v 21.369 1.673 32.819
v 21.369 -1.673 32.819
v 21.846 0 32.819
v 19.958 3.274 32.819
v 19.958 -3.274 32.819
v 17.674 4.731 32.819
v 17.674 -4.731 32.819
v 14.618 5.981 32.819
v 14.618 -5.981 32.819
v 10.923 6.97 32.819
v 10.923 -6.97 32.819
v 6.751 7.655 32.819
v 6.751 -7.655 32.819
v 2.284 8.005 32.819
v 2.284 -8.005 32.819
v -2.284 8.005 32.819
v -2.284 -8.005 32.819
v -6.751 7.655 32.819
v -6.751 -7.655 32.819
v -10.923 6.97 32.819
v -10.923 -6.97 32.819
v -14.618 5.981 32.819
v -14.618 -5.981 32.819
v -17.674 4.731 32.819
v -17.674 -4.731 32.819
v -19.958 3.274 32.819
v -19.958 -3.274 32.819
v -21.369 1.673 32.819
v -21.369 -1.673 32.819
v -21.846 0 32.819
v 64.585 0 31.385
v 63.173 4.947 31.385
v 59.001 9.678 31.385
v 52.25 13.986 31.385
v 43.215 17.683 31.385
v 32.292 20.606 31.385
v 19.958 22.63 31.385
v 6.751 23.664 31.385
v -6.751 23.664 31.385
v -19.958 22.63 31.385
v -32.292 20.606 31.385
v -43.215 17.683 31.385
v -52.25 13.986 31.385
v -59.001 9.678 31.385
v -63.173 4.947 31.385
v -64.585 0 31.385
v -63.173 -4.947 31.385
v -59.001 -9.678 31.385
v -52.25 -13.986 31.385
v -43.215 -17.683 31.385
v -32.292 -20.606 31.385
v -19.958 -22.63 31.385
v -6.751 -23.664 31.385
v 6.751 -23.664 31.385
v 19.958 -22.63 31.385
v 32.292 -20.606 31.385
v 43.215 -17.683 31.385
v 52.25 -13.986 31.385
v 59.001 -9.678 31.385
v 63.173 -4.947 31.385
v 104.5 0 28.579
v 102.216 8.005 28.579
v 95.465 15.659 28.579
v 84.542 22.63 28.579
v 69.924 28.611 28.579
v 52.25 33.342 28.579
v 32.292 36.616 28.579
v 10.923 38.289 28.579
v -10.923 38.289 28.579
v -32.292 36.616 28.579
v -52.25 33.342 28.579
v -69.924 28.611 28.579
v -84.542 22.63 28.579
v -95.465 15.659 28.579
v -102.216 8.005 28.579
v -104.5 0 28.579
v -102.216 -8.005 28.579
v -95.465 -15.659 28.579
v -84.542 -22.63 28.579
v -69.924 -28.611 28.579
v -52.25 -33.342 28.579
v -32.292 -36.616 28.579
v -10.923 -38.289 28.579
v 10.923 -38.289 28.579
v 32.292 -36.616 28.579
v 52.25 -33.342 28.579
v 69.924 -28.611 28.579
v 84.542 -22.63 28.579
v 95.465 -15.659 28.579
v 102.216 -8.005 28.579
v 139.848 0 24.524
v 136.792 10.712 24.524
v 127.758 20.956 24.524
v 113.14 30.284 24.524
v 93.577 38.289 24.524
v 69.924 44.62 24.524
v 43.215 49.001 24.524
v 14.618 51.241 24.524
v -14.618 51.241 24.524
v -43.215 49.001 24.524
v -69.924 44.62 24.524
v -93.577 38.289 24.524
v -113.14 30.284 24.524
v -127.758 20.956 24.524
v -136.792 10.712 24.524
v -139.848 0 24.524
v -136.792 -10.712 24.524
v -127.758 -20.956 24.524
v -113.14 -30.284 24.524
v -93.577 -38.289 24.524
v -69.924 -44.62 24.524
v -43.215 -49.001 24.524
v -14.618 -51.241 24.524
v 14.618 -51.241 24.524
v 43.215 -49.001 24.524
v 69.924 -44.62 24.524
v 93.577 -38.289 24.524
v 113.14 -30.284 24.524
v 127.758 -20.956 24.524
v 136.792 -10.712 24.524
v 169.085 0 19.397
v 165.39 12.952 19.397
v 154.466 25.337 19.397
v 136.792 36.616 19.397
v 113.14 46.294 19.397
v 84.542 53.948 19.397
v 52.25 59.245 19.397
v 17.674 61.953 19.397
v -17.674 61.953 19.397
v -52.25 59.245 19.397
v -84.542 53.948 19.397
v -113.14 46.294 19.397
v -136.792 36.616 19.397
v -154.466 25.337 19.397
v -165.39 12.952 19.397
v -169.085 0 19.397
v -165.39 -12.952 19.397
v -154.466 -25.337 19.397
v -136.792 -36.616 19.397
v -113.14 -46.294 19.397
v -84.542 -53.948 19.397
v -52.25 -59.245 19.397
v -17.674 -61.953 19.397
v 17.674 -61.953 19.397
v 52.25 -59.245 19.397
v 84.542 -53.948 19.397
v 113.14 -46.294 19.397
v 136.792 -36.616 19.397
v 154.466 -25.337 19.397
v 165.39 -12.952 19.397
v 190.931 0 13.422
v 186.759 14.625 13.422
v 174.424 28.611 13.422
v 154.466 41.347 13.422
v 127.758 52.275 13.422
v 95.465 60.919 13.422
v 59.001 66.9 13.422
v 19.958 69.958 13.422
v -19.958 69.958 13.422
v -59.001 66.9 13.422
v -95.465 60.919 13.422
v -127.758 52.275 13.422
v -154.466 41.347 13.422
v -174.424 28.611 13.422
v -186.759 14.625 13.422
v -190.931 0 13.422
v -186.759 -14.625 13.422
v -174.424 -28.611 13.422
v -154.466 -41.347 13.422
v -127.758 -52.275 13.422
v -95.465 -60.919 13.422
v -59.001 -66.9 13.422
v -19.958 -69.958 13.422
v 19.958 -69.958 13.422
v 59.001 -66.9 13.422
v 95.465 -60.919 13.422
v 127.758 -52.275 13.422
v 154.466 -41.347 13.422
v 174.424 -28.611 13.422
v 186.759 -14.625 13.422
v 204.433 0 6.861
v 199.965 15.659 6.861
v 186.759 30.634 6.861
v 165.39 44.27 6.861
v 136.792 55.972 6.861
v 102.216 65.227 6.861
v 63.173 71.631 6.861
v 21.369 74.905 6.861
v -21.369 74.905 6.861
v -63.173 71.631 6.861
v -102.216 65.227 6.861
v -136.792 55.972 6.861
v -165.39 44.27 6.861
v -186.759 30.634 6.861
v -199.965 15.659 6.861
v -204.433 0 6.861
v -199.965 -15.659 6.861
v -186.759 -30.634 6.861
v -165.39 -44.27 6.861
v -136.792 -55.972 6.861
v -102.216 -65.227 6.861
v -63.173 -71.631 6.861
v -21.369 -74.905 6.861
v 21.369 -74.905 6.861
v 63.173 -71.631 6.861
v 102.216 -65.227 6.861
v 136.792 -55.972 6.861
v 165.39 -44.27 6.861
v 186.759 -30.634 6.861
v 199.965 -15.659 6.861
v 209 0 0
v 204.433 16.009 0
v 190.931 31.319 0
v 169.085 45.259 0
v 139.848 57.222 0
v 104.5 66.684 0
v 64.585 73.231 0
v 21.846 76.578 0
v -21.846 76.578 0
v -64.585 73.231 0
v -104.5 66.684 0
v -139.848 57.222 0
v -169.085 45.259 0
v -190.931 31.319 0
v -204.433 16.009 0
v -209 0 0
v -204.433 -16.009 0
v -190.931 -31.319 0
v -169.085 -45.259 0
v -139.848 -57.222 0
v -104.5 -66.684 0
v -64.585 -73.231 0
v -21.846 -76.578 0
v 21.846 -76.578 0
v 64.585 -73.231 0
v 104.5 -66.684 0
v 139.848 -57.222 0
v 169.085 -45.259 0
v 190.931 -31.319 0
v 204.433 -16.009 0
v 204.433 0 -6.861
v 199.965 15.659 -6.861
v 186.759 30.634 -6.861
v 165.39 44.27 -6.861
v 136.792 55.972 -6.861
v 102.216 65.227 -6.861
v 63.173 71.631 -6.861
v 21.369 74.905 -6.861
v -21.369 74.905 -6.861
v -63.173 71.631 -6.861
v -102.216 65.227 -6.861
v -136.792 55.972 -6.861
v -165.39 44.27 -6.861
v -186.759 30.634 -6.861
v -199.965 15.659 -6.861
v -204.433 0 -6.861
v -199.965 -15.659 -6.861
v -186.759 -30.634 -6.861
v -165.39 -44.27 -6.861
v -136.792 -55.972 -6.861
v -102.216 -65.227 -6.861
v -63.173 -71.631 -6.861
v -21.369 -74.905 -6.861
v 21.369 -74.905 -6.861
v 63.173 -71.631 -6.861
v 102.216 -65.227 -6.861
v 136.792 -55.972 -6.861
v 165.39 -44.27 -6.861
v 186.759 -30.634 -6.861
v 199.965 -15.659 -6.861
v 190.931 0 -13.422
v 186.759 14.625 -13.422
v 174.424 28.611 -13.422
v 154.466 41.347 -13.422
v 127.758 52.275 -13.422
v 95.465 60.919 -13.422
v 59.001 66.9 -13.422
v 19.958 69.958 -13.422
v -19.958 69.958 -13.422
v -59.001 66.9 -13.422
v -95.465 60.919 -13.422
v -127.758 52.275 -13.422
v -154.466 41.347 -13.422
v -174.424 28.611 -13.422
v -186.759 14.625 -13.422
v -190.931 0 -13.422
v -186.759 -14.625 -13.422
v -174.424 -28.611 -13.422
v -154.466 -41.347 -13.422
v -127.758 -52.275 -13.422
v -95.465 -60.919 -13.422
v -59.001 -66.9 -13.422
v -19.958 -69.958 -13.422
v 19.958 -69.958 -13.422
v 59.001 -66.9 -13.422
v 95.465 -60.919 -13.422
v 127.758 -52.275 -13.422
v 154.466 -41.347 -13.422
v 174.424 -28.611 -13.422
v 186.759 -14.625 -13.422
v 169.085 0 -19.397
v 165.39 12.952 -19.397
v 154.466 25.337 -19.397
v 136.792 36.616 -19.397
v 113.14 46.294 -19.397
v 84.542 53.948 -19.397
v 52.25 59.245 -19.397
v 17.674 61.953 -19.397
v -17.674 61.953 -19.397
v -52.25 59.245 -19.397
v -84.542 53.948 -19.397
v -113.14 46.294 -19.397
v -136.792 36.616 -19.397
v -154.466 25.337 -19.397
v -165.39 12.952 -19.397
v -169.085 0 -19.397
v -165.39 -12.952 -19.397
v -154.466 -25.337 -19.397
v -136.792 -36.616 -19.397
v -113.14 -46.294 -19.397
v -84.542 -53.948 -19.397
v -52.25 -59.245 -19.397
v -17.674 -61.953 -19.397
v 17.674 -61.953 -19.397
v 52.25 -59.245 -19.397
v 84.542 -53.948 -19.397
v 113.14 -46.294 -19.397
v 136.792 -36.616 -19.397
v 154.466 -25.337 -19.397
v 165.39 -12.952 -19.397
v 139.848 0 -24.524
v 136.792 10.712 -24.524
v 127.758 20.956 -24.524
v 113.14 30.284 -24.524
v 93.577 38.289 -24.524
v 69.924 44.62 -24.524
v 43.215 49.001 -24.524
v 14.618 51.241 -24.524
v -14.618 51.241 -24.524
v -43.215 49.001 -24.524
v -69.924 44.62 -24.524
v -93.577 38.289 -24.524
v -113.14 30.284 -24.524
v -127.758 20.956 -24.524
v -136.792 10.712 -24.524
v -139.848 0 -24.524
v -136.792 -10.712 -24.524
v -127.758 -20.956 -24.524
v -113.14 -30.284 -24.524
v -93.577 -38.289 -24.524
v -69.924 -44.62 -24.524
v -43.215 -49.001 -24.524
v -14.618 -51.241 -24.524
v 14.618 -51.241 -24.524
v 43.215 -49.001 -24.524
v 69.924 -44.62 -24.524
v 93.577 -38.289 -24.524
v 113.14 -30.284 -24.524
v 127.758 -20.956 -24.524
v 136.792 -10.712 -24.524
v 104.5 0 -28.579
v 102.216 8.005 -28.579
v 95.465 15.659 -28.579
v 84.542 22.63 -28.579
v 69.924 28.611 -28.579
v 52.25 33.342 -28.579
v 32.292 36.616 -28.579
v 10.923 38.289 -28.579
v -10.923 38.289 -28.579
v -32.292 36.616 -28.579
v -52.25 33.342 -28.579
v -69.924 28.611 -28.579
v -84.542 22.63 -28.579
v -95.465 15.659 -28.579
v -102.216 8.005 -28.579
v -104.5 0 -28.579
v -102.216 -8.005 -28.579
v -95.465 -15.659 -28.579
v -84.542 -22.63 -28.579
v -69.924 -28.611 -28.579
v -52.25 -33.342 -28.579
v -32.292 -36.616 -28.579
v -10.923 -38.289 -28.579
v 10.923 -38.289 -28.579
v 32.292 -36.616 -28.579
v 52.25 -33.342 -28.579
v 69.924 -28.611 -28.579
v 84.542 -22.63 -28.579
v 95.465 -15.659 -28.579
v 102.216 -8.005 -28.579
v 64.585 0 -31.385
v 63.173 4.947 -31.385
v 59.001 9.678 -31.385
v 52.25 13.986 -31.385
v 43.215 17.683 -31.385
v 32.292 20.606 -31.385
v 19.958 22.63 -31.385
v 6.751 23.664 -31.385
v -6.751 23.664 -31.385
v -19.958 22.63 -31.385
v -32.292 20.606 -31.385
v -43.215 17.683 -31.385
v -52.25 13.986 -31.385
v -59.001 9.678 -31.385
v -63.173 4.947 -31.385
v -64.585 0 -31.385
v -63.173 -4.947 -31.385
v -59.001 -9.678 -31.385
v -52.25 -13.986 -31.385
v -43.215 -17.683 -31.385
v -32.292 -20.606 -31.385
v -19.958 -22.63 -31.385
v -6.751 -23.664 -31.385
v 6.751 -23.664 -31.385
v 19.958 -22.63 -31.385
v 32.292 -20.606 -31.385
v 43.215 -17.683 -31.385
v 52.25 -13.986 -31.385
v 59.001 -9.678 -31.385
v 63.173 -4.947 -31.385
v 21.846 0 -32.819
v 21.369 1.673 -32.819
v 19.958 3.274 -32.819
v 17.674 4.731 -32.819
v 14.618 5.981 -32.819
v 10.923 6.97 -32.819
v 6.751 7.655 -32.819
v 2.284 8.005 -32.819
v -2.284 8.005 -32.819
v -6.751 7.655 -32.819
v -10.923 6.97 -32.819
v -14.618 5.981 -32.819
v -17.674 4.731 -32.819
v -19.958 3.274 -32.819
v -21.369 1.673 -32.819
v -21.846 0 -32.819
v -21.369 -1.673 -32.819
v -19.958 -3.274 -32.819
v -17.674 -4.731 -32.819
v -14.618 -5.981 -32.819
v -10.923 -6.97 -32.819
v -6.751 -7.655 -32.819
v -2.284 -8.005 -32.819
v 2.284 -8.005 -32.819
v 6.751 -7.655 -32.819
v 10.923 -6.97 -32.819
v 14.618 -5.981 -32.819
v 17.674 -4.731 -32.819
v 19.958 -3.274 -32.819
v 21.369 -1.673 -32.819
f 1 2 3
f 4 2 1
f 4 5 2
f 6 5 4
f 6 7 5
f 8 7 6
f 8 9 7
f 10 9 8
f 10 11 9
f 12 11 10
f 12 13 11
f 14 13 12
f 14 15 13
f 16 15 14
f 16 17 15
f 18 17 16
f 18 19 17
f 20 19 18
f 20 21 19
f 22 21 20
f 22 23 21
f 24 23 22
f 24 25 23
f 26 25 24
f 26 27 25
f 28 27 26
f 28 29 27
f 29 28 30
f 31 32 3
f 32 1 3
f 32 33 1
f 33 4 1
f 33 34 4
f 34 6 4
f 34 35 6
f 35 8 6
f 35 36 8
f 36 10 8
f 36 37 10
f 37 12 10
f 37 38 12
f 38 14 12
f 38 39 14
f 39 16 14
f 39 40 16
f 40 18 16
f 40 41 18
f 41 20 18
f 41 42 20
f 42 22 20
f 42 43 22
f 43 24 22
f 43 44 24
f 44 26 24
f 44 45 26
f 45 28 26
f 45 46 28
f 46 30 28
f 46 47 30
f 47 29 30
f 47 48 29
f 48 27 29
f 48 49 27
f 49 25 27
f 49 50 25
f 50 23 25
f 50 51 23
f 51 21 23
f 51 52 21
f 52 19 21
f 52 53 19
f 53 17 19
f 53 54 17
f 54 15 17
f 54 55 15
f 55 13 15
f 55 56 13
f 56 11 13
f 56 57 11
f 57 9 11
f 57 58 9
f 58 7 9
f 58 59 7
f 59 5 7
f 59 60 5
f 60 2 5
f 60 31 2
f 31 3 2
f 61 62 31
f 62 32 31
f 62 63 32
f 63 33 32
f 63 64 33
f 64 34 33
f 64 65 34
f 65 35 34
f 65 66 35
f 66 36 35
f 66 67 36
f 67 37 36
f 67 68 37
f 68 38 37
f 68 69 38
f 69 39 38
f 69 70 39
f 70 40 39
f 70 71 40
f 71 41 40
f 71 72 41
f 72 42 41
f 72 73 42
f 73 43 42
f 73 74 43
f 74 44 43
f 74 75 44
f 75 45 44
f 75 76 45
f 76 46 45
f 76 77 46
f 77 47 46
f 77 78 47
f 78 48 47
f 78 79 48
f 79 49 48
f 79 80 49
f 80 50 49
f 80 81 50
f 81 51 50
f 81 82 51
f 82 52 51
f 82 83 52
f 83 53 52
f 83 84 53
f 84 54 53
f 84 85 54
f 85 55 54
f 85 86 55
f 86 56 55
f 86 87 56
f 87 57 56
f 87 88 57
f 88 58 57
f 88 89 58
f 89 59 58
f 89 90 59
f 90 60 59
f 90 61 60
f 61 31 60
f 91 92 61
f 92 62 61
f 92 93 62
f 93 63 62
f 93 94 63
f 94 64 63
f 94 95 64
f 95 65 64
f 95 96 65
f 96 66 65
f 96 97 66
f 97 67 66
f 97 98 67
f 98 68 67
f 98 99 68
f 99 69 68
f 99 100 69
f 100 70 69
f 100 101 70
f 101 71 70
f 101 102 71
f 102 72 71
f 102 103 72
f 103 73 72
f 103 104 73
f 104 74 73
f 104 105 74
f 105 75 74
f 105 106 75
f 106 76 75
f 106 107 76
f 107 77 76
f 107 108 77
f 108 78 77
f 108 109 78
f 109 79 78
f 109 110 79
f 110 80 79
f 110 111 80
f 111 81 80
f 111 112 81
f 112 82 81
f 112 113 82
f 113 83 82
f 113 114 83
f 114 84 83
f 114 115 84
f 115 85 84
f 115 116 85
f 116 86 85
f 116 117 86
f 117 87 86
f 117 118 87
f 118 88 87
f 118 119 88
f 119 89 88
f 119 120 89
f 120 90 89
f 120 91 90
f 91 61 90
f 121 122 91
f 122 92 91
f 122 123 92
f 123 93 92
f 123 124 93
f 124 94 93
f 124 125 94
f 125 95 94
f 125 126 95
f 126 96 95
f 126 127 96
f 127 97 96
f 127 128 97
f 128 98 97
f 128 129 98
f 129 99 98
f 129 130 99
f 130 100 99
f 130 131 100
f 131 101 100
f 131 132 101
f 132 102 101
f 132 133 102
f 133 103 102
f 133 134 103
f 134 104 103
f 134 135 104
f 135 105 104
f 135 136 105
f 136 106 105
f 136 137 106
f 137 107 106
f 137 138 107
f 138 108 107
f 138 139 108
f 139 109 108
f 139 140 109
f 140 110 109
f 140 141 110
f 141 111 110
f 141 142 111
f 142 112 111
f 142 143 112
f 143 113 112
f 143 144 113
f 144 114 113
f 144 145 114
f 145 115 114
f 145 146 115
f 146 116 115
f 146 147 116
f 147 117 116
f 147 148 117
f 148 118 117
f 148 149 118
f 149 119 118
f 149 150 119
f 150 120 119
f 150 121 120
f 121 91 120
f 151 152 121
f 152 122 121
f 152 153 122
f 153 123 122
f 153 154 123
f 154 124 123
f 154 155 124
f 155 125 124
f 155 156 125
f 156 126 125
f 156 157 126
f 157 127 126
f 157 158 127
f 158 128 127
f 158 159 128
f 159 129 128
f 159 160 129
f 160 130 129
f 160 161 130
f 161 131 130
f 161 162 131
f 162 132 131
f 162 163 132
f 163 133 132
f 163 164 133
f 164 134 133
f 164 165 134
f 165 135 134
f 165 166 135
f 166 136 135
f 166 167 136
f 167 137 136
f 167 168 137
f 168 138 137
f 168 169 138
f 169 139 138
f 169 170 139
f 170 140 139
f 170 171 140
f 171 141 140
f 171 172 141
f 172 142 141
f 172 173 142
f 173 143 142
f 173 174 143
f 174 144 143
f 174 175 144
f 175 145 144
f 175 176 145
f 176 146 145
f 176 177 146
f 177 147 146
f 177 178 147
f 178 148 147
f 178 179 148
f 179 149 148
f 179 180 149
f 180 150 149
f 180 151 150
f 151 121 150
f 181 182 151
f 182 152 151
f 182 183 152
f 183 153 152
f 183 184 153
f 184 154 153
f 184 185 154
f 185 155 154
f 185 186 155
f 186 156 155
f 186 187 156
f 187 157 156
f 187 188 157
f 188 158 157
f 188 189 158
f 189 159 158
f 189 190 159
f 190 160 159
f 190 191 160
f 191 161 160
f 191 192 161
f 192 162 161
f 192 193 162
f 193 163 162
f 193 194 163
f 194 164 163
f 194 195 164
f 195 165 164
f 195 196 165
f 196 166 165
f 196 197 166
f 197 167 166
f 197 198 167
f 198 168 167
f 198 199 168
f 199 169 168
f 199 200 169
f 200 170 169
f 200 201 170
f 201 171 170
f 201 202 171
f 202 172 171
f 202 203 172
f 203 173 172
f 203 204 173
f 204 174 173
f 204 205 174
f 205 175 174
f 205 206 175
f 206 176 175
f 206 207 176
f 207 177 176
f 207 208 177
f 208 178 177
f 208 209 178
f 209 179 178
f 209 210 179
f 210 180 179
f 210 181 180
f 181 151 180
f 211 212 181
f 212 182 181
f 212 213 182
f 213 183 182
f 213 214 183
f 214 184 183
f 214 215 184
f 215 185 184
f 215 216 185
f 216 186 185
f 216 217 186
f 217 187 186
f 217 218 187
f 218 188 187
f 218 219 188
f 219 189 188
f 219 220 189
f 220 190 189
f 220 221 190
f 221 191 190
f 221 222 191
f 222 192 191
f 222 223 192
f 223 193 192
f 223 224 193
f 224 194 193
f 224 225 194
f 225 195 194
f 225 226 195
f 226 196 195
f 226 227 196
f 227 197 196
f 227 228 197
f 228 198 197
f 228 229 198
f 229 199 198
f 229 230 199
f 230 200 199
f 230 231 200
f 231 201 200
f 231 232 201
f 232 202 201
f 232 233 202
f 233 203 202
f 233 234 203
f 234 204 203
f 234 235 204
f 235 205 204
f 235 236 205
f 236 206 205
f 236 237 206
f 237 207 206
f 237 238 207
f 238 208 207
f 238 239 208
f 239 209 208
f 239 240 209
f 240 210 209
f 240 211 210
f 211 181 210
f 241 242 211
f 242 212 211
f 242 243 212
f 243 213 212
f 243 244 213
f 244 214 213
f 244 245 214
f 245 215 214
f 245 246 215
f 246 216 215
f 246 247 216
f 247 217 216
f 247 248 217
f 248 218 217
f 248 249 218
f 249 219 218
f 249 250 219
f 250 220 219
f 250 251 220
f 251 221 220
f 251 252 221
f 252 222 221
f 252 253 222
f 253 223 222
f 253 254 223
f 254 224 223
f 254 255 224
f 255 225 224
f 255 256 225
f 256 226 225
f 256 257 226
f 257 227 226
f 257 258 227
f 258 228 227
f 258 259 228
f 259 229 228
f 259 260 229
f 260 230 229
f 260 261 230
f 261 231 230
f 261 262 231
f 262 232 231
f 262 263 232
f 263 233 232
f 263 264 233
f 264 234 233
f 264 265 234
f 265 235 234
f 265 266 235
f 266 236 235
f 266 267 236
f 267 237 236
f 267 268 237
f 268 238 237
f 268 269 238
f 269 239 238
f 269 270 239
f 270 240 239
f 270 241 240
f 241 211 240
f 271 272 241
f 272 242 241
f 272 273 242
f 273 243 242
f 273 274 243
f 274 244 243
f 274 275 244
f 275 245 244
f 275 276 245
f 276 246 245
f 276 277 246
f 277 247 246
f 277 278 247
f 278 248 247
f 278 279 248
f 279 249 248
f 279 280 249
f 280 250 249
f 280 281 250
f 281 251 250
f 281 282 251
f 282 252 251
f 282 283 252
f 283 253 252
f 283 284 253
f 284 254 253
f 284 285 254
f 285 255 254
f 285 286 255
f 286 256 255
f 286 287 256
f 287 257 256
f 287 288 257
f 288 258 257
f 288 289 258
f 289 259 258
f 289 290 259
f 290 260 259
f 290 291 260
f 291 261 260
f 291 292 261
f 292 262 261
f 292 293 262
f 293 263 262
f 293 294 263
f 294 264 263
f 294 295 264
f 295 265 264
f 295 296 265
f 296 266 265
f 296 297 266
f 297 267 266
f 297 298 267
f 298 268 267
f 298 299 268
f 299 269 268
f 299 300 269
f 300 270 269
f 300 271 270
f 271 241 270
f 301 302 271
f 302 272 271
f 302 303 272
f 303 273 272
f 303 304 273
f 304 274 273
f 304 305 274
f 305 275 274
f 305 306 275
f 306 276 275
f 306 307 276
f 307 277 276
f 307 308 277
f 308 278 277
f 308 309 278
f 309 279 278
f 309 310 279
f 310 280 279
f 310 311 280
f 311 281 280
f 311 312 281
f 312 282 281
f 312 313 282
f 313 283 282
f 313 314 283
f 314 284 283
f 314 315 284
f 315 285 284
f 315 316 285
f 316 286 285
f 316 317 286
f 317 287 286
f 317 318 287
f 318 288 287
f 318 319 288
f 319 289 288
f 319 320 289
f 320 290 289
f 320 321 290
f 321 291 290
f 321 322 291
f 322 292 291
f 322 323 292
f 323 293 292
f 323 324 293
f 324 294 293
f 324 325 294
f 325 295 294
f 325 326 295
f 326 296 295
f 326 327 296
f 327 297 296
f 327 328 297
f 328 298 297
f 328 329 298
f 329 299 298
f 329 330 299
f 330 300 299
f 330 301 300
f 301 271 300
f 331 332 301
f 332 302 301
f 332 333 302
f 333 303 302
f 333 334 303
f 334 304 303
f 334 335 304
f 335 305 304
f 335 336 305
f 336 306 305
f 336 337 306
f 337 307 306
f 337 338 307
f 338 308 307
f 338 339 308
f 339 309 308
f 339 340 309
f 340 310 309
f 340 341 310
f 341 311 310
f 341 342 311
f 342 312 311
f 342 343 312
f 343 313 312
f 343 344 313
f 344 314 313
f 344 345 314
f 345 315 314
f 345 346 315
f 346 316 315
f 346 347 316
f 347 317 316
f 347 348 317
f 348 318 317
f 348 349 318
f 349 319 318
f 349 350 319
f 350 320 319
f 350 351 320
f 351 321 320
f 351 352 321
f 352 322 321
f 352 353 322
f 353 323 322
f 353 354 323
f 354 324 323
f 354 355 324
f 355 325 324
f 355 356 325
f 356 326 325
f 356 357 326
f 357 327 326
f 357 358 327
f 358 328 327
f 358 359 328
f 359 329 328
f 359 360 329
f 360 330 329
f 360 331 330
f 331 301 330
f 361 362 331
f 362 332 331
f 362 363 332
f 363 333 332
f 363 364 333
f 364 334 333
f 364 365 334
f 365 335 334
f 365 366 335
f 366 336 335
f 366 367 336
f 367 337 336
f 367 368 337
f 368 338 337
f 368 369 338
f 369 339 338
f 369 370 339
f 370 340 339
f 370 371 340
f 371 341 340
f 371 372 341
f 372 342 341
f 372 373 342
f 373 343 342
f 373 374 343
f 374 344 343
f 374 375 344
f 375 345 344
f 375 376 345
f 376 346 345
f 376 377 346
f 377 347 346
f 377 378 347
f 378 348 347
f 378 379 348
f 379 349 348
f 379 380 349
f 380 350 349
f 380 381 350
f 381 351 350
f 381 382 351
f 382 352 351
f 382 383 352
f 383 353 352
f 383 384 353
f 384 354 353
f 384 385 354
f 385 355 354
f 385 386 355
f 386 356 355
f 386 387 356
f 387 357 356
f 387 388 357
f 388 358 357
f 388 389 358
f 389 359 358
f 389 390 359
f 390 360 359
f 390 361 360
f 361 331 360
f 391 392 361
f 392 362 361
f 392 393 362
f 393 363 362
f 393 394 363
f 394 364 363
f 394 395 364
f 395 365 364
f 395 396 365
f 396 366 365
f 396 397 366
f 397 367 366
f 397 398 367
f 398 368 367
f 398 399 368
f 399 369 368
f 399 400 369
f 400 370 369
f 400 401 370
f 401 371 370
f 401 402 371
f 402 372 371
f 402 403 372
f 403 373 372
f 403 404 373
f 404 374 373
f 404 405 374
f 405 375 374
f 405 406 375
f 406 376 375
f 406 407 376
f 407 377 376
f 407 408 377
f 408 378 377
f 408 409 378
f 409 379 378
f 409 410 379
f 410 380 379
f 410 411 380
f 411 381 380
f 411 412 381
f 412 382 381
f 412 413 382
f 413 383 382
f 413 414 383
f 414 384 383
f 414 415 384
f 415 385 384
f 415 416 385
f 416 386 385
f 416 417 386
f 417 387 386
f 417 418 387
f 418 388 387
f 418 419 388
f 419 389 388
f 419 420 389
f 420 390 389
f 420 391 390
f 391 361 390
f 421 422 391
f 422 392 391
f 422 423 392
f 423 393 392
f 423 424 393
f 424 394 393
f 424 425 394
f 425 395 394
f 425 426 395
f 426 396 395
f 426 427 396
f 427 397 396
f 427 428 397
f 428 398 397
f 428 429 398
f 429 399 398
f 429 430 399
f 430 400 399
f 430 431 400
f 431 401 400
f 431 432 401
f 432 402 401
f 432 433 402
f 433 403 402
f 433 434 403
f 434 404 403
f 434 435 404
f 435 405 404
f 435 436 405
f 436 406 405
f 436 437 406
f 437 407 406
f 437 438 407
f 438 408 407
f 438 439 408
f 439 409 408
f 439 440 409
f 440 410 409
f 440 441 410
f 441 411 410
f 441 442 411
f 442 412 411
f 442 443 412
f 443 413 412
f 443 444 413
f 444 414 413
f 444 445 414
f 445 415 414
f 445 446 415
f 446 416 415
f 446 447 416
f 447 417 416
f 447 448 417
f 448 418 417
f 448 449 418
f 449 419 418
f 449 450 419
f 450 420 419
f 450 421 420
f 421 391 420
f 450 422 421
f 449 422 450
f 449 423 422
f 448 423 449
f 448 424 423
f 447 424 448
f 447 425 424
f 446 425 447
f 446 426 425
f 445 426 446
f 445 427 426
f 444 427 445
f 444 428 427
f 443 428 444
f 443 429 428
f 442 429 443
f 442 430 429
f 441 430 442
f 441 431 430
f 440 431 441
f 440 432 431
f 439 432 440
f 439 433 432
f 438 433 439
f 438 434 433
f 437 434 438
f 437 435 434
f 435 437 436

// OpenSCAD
// Generated by SolidPython 1.0.1 on 2020-07-29 00:46:53


scale(v = [19, 7, 3]) {
	sphere(r = 11);
}
/***********************************************
*********      SolidPython code:      **********
************************************************
 
# import packages: SolidPython
from solid import *
from solid.utils import *
from itertools import chain, combinations, permutations


class Resize:

    def __init__(self, scad_file):
        self.scad_file = scad_file
        #self.scad_file = import_scad(scad_file)
        # cone/cylinder param:
        self.r1 = 0
        self.r2 = 0
        self.h = 0
        # rectangular prism param:
        self.w = 0
        self.l = 0
        # ellipse param:
        self.r = 0

    # import OpenScad code (file name corresponds to shape)


    # classify shape + parameters
    def assign(self, param1, param2, param3):
        if self.scad_file == 'cone.scad':
            self.r1 = param1
            self.r2 = param2
            self.h = param3
        elif self.scad_file == 'cylinder.scad':
            self.r1 = param1
            self.r2 = param2
            self.h = param3
        elif self.scad_file == 'rectangularPrism.scad':
            self.h = param1
            self.l = param2
            self.w = param3
        else:
            self.r = param1
            self.h = param2

    # resize parameters
    def iterate(self):
        x = range(3, 20, 2)
        i = 1
        if self.scad_file == 'cone.scad':
            tempList = list(permutations(x, 2))
            for temp in tempList:
                param1 = temp[0]
                param2 = temp[1]
                filepath = 'produced_scad_files/' + 'cone' + str(param1) + '_' + str(param2) + '_' + '.scad'
                scad_render_to_file(cylinder(h=param1, r1=param2, r2=0), filepath)

        elif self.scad_file == 'cylinder.scad':
            tempList = list(permutations(x, 3))
            for temp in tempList:
                param1 = temp[0]
                param2 = temp[1]
                filepath = 'produced_scad_files/' + 'cylinder' + str(param1) + '_' + str(param2) + '_' + '.scad'
                scad_render_to_file(cylinder(h=param1, r1=param2, r2=param2), filepath)

        elif self.scad_file == 'rectangularPrism.scad':
            tempList = list(permutations(x, 3))
            for temp in tempList:
                param1 = temp[0]
                param2 = temp[1]
                param3 = temp[2]
                filepath = 'produced_scad_files/' + 'rectangularPrism' + str(param1) + '_' + str(param2) + '_' + str(
                    param3) + '.scad'
                scad_render_to_file(cube(size=(param1, param2, param3)), filepath)

        elif self.scad_file == 'ellipse.scad':
            tempList = list(permutations(x, 4))
            for temp in tempList:
                param1 = temp[0]
                param2 = temp[1]
                param3 = temp[2]
                param4 = temp[3]
                filepath = 'produced_scad_files/' + 'ellipse' + str(param1) + '_' + str(param2) + '_' + str(param3) + '_' + str(param4) + '.scad'
                scad_render_to_file(scale([param1, param2, param3])(sphere(r=param4)), filepath)

    def render_to_scadfile(self):
        scad_render_to_file(scad, 'example.scad') 
 
************************************************/
